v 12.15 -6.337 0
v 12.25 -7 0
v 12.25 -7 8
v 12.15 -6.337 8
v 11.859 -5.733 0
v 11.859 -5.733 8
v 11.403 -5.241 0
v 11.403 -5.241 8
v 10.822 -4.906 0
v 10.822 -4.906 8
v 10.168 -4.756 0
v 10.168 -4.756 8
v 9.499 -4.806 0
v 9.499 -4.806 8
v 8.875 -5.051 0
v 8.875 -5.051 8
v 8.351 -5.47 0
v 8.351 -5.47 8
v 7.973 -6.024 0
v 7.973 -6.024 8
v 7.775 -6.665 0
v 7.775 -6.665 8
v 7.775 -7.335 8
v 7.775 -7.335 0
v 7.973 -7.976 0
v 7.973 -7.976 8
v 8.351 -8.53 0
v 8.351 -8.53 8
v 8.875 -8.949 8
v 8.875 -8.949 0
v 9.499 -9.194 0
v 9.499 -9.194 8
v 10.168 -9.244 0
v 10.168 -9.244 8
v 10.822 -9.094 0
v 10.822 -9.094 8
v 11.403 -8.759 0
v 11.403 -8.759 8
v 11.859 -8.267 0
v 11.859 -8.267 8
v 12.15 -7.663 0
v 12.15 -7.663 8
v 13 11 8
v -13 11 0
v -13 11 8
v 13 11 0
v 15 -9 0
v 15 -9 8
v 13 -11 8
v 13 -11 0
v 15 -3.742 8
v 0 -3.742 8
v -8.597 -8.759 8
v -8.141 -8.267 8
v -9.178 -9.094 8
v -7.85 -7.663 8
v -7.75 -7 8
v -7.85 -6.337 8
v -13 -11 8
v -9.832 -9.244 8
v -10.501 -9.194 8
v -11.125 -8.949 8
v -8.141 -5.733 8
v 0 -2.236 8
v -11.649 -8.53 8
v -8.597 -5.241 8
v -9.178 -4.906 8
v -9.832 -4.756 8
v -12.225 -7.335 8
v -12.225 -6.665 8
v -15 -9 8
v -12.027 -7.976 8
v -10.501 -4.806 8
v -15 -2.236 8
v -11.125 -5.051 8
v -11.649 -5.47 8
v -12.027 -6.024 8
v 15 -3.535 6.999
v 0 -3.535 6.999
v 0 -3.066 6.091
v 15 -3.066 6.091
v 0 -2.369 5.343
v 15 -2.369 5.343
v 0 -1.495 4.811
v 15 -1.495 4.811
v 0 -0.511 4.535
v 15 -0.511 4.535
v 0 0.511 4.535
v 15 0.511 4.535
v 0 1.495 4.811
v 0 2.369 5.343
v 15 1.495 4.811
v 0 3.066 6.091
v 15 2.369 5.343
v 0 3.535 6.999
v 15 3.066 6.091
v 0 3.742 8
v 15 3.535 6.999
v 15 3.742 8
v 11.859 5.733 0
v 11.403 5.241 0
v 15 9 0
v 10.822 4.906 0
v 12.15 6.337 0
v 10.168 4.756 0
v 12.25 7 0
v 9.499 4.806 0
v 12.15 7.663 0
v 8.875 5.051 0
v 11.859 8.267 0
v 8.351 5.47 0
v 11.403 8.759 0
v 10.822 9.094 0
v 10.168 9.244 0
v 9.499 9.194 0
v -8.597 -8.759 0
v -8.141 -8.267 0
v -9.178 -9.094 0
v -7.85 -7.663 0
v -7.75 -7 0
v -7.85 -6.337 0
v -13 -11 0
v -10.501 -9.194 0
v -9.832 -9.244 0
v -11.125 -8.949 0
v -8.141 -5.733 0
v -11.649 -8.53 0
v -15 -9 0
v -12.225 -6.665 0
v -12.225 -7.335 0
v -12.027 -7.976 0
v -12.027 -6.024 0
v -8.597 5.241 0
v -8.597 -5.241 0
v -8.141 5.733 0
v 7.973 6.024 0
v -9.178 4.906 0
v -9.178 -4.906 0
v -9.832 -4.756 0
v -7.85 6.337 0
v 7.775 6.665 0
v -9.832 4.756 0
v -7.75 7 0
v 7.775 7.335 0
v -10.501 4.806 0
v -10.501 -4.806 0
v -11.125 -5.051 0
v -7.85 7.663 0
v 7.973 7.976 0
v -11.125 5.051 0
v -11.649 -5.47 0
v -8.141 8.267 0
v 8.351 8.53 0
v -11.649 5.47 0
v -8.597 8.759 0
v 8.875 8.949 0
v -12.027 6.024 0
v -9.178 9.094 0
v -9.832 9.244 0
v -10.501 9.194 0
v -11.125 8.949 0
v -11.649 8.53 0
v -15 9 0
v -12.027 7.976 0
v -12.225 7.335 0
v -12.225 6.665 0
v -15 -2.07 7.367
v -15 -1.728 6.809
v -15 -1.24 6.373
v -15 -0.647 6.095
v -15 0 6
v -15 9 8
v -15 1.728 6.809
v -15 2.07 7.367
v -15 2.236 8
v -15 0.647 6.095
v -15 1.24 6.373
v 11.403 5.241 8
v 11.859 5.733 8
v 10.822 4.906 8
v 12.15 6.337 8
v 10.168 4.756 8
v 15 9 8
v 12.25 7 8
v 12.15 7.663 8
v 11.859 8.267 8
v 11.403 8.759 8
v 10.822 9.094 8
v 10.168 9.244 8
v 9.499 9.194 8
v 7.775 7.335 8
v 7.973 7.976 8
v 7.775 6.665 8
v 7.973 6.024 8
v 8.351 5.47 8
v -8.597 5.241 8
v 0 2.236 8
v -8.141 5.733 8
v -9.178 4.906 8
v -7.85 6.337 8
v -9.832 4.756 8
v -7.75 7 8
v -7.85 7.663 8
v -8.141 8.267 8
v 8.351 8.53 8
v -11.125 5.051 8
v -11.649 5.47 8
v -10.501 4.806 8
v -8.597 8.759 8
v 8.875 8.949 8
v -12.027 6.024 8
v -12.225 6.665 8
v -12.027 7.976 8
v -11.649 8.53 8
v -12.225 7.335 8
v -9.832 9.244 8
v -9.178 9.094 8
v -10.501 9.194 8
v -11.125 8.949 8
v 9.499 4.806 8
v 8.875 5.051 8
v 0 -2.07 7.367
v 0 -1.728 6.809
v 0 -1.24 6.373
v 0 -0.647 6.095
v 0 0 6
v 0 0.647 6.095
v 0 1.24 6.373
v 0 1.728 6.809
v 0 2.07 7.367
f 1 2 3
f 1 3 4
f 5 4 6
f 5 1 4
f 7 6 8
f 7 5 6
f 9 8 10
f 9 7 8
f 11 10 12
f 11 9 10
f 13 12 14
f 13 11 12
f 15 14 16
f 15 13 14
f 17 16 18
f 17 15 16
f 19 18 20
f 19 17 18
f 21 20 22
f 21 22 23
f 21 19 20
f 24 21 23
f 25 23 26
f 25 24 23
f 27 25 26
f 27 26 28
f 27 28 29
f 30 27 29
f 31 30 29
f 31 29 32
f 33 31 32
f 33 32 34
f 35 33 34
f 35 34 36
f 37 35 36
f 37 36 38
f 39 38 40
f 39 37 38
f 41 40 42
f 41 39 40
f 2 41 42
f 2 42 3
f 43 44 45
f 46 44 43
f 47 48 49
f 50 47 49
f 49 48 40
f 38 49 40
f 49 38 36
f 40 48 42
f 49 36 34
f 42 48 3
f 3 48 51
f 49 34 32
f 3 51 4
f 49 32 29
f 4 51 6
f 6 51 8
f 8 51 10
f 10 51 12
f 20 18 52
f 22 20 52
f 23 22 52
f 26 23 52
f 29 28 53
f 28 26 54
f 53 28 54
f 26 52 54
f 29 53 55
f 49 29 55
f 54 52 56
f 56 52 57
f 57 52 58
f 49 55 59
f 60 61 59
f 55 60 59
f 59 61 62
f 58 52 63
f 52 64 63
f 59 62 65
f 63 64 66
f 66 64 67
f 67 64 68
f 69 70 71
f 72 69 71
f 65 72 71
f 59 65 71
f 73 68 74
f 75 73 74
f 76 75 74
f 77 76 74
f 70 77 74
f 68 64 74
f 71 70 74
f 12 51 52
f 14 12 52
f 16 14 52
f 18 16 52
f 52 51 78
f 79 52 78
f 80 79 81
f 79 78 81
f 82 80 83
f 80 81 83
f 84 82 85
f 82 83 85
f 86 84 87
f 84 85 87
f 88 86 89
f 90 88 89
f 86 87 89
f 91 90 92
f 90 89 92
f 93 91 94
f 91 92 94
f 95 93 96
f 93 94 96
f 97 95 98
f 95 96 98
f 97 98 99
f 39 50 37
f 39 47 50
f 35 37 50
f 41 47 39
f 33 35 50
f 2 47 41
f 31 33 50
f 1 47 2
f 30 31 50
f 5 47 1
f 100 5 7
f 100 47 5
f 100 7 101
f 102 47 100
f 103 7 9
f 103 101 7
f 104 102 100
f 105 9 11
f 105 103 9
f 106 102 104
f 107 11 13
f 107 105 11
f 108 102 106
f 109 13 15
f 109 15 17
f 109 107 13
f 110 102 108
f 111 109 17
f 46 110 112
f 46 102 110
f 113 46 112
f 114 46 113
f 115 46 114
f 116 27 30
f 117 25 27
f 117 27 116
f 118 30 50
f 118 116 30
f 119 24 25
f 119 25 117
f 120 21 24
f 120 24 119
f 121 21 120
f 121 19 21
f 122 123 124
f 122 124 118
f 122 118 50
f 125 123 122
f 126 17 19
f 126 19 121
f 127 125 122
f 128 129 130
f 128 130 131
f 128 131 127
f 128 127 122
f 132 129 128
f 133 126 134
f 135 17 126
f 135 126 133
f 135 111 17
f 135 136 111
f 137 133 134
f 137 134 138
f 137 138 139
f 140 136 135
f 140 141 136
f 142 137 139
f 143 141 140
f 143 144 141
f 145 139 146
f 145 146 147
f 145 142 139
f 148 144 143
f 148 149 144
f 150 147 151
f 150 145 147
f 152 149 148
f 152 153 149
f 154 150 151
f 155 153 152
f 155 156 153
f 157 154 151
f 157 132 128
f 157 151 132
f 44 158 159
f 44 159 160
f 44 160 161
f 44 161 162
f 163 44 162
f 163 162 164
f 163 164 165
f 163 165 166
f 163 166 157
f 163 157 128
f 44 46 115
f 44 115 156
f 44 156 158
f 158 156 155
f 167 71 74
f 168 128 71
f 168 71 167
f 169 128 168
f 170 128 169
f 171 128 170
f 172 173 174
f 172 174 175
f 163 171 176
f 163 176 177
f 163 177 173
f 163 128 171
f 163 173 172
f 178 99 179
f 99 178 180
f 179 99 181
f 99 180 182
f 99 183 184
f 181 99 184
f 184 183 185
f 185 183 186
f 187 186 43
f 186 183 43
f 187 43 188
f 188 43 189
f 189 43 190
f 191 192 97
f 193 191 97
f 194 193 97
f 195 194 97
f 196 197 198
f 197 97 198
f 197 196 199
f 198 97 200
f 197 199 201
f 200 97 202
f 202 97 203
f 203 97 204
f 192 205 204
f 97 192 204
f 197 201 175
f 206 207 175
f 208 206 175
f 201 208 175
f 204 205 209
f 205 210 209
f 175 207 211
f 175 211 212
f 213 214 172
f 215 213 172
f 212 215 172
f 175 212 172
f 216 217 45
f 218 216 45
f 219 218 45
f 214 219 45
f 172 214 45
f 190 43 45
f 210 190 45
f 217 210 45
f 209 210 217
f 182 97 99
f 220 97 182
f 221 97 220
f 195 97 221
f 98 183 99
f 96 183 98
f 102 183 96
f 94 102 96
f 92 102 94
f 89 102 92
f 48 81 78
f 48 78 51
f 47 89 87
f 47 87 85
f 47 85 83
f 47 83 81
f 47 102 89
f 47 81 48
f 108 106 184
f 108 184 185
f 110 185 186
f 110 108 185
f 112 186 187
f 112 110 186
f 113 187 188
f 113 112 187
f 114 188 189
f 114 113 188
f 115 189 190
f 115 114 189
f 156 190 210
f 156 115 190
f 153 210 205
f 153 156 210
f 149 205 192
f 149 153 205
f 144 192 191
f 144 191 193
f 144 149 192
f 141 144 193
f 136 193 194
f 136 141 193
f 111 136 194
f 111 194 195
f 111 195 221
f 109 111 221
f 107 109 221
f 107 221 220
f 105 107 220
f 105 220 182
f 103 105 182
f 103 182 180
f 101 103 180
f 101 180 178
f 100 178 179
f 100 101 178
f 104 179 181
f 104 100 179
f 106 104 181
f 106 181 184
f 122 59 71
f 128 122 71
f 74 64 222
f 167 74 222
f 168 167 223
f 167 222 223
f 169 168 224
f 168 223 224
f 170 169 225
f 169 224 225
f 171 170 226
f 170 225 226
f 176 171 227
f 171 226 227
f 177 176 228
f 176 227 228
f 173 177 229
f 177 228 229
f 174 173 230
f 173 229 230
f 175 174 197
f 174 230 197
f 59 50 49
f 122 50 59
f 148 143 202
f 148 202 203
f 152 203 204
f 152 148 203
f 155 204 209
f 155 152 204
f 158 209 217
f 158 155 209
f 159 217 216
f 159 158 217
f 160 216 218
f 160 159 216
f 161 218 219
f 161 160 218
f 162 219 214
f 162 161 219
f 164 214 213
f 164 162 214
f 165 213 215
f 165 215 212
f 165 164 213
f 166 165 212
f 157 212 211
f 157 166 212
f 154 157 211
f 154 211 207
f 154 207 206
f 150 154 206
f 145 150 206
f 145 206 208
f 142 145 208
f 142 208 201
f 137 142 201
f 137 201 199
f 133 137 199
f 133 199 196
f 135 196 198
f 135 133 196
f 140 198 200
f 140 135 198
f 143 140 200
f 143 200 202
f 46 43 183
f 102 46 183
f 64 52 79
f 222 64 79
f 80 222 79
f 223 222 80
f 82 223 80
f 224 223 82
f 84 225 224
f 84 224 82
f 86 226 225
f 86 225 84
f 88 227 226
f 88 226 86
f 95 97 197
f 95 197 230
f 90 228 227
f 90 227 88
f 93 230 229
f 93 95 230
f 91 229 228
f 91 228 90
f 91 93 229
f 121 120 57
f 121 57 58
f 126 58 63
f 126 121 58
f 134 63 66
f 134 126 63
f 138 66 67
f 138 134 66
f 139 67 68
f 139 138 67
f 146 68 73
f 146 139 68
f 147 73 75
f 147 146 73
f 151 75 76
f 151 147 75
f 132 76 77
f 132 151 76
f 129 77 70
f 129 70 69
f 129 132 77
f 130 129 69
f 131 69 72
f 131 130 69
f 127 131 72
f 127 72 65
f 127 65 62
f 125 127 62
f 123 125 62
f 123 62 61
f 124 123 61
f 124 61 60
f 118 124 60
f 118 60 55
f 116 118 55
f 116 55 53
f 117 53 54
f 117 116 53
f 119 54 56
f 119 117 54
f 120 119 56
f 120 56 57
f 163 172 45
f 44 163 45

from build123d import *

# Parameters (mm, degrees)
SKETCH2_R           = 2.25
BOSS_EXTRUDE1_DEPTH = 8
CUT_EXTRUDE1_REACH  = 34.939
SKETCH3_R           = 2.25
SKETCH4_R           = 3.75
CUT_EXTRUDE2_DEPTH  = 15


with BuildPart() as part:
    # Sketch2 → Boss-Extrude1 (new body)
    with BuildSketch(Plane.XY):
        Polygon((-13, 11), (13, 11), (15, 9), (15, -9), (13, -11), (-13, -11), (-15, -9), (-15, 9), align=None)
        with Locations((-10, 7)):
            Circle(SKETCH2_R, mode=Mode.SUBTRACT)
        with Locations((-10, -7)):
            Circle(SKETCH2_R, mode=Mode.SUBTRACT)
        with Locations((10, 7)):
            Circle(SKETCH2_R, mode=Mode.SUBTRACT)
        with Locations((10, -7)):
            Circle(SKETCH2_R, mode=Mode.SUBTRACT)
    extrude(amount=BOSS_EXTRUDE1_DEPTH)

    # Sketch3 → Cut-Extrude1 (cut, up to next)
    with BuildSketch(Plane(origin=(15, 0, 0), x_dir=(0, 0, -1), z_dir=(1, 0, 0)), mode=Mode.PRIVATE) as cut_extrude1_sk1:
        with Locations((-8.25, 0)):
            Circle(SKETCH3_R)
    cut_extrude1_tool1 = extrude(cut_extrude1_sk1.sketch, amount=-CUT_EXTRUDE1_REACH, mode=Mode.PRIVATE) & part.part
    add(cut_extrude1_tool1.solids().sort_by_distance((15, 0, 8.25))[0], mode=Mode.SUBTRACT)

    # Sketch4 → Cut-Extrude2 (cut)
    with BuildSketch(Plane(origin=(15, 0, 0), x_dir=(0, 0, -1), z_dir=(1, 0, 0))):
        with Locations((-8.25, 0)):
            Circle(SKETCH4_R)
    extrude(amount=-CUT_EXTRUDE2_DEPTH, mode=Mode.SUBTRACT)


solid = part.part
